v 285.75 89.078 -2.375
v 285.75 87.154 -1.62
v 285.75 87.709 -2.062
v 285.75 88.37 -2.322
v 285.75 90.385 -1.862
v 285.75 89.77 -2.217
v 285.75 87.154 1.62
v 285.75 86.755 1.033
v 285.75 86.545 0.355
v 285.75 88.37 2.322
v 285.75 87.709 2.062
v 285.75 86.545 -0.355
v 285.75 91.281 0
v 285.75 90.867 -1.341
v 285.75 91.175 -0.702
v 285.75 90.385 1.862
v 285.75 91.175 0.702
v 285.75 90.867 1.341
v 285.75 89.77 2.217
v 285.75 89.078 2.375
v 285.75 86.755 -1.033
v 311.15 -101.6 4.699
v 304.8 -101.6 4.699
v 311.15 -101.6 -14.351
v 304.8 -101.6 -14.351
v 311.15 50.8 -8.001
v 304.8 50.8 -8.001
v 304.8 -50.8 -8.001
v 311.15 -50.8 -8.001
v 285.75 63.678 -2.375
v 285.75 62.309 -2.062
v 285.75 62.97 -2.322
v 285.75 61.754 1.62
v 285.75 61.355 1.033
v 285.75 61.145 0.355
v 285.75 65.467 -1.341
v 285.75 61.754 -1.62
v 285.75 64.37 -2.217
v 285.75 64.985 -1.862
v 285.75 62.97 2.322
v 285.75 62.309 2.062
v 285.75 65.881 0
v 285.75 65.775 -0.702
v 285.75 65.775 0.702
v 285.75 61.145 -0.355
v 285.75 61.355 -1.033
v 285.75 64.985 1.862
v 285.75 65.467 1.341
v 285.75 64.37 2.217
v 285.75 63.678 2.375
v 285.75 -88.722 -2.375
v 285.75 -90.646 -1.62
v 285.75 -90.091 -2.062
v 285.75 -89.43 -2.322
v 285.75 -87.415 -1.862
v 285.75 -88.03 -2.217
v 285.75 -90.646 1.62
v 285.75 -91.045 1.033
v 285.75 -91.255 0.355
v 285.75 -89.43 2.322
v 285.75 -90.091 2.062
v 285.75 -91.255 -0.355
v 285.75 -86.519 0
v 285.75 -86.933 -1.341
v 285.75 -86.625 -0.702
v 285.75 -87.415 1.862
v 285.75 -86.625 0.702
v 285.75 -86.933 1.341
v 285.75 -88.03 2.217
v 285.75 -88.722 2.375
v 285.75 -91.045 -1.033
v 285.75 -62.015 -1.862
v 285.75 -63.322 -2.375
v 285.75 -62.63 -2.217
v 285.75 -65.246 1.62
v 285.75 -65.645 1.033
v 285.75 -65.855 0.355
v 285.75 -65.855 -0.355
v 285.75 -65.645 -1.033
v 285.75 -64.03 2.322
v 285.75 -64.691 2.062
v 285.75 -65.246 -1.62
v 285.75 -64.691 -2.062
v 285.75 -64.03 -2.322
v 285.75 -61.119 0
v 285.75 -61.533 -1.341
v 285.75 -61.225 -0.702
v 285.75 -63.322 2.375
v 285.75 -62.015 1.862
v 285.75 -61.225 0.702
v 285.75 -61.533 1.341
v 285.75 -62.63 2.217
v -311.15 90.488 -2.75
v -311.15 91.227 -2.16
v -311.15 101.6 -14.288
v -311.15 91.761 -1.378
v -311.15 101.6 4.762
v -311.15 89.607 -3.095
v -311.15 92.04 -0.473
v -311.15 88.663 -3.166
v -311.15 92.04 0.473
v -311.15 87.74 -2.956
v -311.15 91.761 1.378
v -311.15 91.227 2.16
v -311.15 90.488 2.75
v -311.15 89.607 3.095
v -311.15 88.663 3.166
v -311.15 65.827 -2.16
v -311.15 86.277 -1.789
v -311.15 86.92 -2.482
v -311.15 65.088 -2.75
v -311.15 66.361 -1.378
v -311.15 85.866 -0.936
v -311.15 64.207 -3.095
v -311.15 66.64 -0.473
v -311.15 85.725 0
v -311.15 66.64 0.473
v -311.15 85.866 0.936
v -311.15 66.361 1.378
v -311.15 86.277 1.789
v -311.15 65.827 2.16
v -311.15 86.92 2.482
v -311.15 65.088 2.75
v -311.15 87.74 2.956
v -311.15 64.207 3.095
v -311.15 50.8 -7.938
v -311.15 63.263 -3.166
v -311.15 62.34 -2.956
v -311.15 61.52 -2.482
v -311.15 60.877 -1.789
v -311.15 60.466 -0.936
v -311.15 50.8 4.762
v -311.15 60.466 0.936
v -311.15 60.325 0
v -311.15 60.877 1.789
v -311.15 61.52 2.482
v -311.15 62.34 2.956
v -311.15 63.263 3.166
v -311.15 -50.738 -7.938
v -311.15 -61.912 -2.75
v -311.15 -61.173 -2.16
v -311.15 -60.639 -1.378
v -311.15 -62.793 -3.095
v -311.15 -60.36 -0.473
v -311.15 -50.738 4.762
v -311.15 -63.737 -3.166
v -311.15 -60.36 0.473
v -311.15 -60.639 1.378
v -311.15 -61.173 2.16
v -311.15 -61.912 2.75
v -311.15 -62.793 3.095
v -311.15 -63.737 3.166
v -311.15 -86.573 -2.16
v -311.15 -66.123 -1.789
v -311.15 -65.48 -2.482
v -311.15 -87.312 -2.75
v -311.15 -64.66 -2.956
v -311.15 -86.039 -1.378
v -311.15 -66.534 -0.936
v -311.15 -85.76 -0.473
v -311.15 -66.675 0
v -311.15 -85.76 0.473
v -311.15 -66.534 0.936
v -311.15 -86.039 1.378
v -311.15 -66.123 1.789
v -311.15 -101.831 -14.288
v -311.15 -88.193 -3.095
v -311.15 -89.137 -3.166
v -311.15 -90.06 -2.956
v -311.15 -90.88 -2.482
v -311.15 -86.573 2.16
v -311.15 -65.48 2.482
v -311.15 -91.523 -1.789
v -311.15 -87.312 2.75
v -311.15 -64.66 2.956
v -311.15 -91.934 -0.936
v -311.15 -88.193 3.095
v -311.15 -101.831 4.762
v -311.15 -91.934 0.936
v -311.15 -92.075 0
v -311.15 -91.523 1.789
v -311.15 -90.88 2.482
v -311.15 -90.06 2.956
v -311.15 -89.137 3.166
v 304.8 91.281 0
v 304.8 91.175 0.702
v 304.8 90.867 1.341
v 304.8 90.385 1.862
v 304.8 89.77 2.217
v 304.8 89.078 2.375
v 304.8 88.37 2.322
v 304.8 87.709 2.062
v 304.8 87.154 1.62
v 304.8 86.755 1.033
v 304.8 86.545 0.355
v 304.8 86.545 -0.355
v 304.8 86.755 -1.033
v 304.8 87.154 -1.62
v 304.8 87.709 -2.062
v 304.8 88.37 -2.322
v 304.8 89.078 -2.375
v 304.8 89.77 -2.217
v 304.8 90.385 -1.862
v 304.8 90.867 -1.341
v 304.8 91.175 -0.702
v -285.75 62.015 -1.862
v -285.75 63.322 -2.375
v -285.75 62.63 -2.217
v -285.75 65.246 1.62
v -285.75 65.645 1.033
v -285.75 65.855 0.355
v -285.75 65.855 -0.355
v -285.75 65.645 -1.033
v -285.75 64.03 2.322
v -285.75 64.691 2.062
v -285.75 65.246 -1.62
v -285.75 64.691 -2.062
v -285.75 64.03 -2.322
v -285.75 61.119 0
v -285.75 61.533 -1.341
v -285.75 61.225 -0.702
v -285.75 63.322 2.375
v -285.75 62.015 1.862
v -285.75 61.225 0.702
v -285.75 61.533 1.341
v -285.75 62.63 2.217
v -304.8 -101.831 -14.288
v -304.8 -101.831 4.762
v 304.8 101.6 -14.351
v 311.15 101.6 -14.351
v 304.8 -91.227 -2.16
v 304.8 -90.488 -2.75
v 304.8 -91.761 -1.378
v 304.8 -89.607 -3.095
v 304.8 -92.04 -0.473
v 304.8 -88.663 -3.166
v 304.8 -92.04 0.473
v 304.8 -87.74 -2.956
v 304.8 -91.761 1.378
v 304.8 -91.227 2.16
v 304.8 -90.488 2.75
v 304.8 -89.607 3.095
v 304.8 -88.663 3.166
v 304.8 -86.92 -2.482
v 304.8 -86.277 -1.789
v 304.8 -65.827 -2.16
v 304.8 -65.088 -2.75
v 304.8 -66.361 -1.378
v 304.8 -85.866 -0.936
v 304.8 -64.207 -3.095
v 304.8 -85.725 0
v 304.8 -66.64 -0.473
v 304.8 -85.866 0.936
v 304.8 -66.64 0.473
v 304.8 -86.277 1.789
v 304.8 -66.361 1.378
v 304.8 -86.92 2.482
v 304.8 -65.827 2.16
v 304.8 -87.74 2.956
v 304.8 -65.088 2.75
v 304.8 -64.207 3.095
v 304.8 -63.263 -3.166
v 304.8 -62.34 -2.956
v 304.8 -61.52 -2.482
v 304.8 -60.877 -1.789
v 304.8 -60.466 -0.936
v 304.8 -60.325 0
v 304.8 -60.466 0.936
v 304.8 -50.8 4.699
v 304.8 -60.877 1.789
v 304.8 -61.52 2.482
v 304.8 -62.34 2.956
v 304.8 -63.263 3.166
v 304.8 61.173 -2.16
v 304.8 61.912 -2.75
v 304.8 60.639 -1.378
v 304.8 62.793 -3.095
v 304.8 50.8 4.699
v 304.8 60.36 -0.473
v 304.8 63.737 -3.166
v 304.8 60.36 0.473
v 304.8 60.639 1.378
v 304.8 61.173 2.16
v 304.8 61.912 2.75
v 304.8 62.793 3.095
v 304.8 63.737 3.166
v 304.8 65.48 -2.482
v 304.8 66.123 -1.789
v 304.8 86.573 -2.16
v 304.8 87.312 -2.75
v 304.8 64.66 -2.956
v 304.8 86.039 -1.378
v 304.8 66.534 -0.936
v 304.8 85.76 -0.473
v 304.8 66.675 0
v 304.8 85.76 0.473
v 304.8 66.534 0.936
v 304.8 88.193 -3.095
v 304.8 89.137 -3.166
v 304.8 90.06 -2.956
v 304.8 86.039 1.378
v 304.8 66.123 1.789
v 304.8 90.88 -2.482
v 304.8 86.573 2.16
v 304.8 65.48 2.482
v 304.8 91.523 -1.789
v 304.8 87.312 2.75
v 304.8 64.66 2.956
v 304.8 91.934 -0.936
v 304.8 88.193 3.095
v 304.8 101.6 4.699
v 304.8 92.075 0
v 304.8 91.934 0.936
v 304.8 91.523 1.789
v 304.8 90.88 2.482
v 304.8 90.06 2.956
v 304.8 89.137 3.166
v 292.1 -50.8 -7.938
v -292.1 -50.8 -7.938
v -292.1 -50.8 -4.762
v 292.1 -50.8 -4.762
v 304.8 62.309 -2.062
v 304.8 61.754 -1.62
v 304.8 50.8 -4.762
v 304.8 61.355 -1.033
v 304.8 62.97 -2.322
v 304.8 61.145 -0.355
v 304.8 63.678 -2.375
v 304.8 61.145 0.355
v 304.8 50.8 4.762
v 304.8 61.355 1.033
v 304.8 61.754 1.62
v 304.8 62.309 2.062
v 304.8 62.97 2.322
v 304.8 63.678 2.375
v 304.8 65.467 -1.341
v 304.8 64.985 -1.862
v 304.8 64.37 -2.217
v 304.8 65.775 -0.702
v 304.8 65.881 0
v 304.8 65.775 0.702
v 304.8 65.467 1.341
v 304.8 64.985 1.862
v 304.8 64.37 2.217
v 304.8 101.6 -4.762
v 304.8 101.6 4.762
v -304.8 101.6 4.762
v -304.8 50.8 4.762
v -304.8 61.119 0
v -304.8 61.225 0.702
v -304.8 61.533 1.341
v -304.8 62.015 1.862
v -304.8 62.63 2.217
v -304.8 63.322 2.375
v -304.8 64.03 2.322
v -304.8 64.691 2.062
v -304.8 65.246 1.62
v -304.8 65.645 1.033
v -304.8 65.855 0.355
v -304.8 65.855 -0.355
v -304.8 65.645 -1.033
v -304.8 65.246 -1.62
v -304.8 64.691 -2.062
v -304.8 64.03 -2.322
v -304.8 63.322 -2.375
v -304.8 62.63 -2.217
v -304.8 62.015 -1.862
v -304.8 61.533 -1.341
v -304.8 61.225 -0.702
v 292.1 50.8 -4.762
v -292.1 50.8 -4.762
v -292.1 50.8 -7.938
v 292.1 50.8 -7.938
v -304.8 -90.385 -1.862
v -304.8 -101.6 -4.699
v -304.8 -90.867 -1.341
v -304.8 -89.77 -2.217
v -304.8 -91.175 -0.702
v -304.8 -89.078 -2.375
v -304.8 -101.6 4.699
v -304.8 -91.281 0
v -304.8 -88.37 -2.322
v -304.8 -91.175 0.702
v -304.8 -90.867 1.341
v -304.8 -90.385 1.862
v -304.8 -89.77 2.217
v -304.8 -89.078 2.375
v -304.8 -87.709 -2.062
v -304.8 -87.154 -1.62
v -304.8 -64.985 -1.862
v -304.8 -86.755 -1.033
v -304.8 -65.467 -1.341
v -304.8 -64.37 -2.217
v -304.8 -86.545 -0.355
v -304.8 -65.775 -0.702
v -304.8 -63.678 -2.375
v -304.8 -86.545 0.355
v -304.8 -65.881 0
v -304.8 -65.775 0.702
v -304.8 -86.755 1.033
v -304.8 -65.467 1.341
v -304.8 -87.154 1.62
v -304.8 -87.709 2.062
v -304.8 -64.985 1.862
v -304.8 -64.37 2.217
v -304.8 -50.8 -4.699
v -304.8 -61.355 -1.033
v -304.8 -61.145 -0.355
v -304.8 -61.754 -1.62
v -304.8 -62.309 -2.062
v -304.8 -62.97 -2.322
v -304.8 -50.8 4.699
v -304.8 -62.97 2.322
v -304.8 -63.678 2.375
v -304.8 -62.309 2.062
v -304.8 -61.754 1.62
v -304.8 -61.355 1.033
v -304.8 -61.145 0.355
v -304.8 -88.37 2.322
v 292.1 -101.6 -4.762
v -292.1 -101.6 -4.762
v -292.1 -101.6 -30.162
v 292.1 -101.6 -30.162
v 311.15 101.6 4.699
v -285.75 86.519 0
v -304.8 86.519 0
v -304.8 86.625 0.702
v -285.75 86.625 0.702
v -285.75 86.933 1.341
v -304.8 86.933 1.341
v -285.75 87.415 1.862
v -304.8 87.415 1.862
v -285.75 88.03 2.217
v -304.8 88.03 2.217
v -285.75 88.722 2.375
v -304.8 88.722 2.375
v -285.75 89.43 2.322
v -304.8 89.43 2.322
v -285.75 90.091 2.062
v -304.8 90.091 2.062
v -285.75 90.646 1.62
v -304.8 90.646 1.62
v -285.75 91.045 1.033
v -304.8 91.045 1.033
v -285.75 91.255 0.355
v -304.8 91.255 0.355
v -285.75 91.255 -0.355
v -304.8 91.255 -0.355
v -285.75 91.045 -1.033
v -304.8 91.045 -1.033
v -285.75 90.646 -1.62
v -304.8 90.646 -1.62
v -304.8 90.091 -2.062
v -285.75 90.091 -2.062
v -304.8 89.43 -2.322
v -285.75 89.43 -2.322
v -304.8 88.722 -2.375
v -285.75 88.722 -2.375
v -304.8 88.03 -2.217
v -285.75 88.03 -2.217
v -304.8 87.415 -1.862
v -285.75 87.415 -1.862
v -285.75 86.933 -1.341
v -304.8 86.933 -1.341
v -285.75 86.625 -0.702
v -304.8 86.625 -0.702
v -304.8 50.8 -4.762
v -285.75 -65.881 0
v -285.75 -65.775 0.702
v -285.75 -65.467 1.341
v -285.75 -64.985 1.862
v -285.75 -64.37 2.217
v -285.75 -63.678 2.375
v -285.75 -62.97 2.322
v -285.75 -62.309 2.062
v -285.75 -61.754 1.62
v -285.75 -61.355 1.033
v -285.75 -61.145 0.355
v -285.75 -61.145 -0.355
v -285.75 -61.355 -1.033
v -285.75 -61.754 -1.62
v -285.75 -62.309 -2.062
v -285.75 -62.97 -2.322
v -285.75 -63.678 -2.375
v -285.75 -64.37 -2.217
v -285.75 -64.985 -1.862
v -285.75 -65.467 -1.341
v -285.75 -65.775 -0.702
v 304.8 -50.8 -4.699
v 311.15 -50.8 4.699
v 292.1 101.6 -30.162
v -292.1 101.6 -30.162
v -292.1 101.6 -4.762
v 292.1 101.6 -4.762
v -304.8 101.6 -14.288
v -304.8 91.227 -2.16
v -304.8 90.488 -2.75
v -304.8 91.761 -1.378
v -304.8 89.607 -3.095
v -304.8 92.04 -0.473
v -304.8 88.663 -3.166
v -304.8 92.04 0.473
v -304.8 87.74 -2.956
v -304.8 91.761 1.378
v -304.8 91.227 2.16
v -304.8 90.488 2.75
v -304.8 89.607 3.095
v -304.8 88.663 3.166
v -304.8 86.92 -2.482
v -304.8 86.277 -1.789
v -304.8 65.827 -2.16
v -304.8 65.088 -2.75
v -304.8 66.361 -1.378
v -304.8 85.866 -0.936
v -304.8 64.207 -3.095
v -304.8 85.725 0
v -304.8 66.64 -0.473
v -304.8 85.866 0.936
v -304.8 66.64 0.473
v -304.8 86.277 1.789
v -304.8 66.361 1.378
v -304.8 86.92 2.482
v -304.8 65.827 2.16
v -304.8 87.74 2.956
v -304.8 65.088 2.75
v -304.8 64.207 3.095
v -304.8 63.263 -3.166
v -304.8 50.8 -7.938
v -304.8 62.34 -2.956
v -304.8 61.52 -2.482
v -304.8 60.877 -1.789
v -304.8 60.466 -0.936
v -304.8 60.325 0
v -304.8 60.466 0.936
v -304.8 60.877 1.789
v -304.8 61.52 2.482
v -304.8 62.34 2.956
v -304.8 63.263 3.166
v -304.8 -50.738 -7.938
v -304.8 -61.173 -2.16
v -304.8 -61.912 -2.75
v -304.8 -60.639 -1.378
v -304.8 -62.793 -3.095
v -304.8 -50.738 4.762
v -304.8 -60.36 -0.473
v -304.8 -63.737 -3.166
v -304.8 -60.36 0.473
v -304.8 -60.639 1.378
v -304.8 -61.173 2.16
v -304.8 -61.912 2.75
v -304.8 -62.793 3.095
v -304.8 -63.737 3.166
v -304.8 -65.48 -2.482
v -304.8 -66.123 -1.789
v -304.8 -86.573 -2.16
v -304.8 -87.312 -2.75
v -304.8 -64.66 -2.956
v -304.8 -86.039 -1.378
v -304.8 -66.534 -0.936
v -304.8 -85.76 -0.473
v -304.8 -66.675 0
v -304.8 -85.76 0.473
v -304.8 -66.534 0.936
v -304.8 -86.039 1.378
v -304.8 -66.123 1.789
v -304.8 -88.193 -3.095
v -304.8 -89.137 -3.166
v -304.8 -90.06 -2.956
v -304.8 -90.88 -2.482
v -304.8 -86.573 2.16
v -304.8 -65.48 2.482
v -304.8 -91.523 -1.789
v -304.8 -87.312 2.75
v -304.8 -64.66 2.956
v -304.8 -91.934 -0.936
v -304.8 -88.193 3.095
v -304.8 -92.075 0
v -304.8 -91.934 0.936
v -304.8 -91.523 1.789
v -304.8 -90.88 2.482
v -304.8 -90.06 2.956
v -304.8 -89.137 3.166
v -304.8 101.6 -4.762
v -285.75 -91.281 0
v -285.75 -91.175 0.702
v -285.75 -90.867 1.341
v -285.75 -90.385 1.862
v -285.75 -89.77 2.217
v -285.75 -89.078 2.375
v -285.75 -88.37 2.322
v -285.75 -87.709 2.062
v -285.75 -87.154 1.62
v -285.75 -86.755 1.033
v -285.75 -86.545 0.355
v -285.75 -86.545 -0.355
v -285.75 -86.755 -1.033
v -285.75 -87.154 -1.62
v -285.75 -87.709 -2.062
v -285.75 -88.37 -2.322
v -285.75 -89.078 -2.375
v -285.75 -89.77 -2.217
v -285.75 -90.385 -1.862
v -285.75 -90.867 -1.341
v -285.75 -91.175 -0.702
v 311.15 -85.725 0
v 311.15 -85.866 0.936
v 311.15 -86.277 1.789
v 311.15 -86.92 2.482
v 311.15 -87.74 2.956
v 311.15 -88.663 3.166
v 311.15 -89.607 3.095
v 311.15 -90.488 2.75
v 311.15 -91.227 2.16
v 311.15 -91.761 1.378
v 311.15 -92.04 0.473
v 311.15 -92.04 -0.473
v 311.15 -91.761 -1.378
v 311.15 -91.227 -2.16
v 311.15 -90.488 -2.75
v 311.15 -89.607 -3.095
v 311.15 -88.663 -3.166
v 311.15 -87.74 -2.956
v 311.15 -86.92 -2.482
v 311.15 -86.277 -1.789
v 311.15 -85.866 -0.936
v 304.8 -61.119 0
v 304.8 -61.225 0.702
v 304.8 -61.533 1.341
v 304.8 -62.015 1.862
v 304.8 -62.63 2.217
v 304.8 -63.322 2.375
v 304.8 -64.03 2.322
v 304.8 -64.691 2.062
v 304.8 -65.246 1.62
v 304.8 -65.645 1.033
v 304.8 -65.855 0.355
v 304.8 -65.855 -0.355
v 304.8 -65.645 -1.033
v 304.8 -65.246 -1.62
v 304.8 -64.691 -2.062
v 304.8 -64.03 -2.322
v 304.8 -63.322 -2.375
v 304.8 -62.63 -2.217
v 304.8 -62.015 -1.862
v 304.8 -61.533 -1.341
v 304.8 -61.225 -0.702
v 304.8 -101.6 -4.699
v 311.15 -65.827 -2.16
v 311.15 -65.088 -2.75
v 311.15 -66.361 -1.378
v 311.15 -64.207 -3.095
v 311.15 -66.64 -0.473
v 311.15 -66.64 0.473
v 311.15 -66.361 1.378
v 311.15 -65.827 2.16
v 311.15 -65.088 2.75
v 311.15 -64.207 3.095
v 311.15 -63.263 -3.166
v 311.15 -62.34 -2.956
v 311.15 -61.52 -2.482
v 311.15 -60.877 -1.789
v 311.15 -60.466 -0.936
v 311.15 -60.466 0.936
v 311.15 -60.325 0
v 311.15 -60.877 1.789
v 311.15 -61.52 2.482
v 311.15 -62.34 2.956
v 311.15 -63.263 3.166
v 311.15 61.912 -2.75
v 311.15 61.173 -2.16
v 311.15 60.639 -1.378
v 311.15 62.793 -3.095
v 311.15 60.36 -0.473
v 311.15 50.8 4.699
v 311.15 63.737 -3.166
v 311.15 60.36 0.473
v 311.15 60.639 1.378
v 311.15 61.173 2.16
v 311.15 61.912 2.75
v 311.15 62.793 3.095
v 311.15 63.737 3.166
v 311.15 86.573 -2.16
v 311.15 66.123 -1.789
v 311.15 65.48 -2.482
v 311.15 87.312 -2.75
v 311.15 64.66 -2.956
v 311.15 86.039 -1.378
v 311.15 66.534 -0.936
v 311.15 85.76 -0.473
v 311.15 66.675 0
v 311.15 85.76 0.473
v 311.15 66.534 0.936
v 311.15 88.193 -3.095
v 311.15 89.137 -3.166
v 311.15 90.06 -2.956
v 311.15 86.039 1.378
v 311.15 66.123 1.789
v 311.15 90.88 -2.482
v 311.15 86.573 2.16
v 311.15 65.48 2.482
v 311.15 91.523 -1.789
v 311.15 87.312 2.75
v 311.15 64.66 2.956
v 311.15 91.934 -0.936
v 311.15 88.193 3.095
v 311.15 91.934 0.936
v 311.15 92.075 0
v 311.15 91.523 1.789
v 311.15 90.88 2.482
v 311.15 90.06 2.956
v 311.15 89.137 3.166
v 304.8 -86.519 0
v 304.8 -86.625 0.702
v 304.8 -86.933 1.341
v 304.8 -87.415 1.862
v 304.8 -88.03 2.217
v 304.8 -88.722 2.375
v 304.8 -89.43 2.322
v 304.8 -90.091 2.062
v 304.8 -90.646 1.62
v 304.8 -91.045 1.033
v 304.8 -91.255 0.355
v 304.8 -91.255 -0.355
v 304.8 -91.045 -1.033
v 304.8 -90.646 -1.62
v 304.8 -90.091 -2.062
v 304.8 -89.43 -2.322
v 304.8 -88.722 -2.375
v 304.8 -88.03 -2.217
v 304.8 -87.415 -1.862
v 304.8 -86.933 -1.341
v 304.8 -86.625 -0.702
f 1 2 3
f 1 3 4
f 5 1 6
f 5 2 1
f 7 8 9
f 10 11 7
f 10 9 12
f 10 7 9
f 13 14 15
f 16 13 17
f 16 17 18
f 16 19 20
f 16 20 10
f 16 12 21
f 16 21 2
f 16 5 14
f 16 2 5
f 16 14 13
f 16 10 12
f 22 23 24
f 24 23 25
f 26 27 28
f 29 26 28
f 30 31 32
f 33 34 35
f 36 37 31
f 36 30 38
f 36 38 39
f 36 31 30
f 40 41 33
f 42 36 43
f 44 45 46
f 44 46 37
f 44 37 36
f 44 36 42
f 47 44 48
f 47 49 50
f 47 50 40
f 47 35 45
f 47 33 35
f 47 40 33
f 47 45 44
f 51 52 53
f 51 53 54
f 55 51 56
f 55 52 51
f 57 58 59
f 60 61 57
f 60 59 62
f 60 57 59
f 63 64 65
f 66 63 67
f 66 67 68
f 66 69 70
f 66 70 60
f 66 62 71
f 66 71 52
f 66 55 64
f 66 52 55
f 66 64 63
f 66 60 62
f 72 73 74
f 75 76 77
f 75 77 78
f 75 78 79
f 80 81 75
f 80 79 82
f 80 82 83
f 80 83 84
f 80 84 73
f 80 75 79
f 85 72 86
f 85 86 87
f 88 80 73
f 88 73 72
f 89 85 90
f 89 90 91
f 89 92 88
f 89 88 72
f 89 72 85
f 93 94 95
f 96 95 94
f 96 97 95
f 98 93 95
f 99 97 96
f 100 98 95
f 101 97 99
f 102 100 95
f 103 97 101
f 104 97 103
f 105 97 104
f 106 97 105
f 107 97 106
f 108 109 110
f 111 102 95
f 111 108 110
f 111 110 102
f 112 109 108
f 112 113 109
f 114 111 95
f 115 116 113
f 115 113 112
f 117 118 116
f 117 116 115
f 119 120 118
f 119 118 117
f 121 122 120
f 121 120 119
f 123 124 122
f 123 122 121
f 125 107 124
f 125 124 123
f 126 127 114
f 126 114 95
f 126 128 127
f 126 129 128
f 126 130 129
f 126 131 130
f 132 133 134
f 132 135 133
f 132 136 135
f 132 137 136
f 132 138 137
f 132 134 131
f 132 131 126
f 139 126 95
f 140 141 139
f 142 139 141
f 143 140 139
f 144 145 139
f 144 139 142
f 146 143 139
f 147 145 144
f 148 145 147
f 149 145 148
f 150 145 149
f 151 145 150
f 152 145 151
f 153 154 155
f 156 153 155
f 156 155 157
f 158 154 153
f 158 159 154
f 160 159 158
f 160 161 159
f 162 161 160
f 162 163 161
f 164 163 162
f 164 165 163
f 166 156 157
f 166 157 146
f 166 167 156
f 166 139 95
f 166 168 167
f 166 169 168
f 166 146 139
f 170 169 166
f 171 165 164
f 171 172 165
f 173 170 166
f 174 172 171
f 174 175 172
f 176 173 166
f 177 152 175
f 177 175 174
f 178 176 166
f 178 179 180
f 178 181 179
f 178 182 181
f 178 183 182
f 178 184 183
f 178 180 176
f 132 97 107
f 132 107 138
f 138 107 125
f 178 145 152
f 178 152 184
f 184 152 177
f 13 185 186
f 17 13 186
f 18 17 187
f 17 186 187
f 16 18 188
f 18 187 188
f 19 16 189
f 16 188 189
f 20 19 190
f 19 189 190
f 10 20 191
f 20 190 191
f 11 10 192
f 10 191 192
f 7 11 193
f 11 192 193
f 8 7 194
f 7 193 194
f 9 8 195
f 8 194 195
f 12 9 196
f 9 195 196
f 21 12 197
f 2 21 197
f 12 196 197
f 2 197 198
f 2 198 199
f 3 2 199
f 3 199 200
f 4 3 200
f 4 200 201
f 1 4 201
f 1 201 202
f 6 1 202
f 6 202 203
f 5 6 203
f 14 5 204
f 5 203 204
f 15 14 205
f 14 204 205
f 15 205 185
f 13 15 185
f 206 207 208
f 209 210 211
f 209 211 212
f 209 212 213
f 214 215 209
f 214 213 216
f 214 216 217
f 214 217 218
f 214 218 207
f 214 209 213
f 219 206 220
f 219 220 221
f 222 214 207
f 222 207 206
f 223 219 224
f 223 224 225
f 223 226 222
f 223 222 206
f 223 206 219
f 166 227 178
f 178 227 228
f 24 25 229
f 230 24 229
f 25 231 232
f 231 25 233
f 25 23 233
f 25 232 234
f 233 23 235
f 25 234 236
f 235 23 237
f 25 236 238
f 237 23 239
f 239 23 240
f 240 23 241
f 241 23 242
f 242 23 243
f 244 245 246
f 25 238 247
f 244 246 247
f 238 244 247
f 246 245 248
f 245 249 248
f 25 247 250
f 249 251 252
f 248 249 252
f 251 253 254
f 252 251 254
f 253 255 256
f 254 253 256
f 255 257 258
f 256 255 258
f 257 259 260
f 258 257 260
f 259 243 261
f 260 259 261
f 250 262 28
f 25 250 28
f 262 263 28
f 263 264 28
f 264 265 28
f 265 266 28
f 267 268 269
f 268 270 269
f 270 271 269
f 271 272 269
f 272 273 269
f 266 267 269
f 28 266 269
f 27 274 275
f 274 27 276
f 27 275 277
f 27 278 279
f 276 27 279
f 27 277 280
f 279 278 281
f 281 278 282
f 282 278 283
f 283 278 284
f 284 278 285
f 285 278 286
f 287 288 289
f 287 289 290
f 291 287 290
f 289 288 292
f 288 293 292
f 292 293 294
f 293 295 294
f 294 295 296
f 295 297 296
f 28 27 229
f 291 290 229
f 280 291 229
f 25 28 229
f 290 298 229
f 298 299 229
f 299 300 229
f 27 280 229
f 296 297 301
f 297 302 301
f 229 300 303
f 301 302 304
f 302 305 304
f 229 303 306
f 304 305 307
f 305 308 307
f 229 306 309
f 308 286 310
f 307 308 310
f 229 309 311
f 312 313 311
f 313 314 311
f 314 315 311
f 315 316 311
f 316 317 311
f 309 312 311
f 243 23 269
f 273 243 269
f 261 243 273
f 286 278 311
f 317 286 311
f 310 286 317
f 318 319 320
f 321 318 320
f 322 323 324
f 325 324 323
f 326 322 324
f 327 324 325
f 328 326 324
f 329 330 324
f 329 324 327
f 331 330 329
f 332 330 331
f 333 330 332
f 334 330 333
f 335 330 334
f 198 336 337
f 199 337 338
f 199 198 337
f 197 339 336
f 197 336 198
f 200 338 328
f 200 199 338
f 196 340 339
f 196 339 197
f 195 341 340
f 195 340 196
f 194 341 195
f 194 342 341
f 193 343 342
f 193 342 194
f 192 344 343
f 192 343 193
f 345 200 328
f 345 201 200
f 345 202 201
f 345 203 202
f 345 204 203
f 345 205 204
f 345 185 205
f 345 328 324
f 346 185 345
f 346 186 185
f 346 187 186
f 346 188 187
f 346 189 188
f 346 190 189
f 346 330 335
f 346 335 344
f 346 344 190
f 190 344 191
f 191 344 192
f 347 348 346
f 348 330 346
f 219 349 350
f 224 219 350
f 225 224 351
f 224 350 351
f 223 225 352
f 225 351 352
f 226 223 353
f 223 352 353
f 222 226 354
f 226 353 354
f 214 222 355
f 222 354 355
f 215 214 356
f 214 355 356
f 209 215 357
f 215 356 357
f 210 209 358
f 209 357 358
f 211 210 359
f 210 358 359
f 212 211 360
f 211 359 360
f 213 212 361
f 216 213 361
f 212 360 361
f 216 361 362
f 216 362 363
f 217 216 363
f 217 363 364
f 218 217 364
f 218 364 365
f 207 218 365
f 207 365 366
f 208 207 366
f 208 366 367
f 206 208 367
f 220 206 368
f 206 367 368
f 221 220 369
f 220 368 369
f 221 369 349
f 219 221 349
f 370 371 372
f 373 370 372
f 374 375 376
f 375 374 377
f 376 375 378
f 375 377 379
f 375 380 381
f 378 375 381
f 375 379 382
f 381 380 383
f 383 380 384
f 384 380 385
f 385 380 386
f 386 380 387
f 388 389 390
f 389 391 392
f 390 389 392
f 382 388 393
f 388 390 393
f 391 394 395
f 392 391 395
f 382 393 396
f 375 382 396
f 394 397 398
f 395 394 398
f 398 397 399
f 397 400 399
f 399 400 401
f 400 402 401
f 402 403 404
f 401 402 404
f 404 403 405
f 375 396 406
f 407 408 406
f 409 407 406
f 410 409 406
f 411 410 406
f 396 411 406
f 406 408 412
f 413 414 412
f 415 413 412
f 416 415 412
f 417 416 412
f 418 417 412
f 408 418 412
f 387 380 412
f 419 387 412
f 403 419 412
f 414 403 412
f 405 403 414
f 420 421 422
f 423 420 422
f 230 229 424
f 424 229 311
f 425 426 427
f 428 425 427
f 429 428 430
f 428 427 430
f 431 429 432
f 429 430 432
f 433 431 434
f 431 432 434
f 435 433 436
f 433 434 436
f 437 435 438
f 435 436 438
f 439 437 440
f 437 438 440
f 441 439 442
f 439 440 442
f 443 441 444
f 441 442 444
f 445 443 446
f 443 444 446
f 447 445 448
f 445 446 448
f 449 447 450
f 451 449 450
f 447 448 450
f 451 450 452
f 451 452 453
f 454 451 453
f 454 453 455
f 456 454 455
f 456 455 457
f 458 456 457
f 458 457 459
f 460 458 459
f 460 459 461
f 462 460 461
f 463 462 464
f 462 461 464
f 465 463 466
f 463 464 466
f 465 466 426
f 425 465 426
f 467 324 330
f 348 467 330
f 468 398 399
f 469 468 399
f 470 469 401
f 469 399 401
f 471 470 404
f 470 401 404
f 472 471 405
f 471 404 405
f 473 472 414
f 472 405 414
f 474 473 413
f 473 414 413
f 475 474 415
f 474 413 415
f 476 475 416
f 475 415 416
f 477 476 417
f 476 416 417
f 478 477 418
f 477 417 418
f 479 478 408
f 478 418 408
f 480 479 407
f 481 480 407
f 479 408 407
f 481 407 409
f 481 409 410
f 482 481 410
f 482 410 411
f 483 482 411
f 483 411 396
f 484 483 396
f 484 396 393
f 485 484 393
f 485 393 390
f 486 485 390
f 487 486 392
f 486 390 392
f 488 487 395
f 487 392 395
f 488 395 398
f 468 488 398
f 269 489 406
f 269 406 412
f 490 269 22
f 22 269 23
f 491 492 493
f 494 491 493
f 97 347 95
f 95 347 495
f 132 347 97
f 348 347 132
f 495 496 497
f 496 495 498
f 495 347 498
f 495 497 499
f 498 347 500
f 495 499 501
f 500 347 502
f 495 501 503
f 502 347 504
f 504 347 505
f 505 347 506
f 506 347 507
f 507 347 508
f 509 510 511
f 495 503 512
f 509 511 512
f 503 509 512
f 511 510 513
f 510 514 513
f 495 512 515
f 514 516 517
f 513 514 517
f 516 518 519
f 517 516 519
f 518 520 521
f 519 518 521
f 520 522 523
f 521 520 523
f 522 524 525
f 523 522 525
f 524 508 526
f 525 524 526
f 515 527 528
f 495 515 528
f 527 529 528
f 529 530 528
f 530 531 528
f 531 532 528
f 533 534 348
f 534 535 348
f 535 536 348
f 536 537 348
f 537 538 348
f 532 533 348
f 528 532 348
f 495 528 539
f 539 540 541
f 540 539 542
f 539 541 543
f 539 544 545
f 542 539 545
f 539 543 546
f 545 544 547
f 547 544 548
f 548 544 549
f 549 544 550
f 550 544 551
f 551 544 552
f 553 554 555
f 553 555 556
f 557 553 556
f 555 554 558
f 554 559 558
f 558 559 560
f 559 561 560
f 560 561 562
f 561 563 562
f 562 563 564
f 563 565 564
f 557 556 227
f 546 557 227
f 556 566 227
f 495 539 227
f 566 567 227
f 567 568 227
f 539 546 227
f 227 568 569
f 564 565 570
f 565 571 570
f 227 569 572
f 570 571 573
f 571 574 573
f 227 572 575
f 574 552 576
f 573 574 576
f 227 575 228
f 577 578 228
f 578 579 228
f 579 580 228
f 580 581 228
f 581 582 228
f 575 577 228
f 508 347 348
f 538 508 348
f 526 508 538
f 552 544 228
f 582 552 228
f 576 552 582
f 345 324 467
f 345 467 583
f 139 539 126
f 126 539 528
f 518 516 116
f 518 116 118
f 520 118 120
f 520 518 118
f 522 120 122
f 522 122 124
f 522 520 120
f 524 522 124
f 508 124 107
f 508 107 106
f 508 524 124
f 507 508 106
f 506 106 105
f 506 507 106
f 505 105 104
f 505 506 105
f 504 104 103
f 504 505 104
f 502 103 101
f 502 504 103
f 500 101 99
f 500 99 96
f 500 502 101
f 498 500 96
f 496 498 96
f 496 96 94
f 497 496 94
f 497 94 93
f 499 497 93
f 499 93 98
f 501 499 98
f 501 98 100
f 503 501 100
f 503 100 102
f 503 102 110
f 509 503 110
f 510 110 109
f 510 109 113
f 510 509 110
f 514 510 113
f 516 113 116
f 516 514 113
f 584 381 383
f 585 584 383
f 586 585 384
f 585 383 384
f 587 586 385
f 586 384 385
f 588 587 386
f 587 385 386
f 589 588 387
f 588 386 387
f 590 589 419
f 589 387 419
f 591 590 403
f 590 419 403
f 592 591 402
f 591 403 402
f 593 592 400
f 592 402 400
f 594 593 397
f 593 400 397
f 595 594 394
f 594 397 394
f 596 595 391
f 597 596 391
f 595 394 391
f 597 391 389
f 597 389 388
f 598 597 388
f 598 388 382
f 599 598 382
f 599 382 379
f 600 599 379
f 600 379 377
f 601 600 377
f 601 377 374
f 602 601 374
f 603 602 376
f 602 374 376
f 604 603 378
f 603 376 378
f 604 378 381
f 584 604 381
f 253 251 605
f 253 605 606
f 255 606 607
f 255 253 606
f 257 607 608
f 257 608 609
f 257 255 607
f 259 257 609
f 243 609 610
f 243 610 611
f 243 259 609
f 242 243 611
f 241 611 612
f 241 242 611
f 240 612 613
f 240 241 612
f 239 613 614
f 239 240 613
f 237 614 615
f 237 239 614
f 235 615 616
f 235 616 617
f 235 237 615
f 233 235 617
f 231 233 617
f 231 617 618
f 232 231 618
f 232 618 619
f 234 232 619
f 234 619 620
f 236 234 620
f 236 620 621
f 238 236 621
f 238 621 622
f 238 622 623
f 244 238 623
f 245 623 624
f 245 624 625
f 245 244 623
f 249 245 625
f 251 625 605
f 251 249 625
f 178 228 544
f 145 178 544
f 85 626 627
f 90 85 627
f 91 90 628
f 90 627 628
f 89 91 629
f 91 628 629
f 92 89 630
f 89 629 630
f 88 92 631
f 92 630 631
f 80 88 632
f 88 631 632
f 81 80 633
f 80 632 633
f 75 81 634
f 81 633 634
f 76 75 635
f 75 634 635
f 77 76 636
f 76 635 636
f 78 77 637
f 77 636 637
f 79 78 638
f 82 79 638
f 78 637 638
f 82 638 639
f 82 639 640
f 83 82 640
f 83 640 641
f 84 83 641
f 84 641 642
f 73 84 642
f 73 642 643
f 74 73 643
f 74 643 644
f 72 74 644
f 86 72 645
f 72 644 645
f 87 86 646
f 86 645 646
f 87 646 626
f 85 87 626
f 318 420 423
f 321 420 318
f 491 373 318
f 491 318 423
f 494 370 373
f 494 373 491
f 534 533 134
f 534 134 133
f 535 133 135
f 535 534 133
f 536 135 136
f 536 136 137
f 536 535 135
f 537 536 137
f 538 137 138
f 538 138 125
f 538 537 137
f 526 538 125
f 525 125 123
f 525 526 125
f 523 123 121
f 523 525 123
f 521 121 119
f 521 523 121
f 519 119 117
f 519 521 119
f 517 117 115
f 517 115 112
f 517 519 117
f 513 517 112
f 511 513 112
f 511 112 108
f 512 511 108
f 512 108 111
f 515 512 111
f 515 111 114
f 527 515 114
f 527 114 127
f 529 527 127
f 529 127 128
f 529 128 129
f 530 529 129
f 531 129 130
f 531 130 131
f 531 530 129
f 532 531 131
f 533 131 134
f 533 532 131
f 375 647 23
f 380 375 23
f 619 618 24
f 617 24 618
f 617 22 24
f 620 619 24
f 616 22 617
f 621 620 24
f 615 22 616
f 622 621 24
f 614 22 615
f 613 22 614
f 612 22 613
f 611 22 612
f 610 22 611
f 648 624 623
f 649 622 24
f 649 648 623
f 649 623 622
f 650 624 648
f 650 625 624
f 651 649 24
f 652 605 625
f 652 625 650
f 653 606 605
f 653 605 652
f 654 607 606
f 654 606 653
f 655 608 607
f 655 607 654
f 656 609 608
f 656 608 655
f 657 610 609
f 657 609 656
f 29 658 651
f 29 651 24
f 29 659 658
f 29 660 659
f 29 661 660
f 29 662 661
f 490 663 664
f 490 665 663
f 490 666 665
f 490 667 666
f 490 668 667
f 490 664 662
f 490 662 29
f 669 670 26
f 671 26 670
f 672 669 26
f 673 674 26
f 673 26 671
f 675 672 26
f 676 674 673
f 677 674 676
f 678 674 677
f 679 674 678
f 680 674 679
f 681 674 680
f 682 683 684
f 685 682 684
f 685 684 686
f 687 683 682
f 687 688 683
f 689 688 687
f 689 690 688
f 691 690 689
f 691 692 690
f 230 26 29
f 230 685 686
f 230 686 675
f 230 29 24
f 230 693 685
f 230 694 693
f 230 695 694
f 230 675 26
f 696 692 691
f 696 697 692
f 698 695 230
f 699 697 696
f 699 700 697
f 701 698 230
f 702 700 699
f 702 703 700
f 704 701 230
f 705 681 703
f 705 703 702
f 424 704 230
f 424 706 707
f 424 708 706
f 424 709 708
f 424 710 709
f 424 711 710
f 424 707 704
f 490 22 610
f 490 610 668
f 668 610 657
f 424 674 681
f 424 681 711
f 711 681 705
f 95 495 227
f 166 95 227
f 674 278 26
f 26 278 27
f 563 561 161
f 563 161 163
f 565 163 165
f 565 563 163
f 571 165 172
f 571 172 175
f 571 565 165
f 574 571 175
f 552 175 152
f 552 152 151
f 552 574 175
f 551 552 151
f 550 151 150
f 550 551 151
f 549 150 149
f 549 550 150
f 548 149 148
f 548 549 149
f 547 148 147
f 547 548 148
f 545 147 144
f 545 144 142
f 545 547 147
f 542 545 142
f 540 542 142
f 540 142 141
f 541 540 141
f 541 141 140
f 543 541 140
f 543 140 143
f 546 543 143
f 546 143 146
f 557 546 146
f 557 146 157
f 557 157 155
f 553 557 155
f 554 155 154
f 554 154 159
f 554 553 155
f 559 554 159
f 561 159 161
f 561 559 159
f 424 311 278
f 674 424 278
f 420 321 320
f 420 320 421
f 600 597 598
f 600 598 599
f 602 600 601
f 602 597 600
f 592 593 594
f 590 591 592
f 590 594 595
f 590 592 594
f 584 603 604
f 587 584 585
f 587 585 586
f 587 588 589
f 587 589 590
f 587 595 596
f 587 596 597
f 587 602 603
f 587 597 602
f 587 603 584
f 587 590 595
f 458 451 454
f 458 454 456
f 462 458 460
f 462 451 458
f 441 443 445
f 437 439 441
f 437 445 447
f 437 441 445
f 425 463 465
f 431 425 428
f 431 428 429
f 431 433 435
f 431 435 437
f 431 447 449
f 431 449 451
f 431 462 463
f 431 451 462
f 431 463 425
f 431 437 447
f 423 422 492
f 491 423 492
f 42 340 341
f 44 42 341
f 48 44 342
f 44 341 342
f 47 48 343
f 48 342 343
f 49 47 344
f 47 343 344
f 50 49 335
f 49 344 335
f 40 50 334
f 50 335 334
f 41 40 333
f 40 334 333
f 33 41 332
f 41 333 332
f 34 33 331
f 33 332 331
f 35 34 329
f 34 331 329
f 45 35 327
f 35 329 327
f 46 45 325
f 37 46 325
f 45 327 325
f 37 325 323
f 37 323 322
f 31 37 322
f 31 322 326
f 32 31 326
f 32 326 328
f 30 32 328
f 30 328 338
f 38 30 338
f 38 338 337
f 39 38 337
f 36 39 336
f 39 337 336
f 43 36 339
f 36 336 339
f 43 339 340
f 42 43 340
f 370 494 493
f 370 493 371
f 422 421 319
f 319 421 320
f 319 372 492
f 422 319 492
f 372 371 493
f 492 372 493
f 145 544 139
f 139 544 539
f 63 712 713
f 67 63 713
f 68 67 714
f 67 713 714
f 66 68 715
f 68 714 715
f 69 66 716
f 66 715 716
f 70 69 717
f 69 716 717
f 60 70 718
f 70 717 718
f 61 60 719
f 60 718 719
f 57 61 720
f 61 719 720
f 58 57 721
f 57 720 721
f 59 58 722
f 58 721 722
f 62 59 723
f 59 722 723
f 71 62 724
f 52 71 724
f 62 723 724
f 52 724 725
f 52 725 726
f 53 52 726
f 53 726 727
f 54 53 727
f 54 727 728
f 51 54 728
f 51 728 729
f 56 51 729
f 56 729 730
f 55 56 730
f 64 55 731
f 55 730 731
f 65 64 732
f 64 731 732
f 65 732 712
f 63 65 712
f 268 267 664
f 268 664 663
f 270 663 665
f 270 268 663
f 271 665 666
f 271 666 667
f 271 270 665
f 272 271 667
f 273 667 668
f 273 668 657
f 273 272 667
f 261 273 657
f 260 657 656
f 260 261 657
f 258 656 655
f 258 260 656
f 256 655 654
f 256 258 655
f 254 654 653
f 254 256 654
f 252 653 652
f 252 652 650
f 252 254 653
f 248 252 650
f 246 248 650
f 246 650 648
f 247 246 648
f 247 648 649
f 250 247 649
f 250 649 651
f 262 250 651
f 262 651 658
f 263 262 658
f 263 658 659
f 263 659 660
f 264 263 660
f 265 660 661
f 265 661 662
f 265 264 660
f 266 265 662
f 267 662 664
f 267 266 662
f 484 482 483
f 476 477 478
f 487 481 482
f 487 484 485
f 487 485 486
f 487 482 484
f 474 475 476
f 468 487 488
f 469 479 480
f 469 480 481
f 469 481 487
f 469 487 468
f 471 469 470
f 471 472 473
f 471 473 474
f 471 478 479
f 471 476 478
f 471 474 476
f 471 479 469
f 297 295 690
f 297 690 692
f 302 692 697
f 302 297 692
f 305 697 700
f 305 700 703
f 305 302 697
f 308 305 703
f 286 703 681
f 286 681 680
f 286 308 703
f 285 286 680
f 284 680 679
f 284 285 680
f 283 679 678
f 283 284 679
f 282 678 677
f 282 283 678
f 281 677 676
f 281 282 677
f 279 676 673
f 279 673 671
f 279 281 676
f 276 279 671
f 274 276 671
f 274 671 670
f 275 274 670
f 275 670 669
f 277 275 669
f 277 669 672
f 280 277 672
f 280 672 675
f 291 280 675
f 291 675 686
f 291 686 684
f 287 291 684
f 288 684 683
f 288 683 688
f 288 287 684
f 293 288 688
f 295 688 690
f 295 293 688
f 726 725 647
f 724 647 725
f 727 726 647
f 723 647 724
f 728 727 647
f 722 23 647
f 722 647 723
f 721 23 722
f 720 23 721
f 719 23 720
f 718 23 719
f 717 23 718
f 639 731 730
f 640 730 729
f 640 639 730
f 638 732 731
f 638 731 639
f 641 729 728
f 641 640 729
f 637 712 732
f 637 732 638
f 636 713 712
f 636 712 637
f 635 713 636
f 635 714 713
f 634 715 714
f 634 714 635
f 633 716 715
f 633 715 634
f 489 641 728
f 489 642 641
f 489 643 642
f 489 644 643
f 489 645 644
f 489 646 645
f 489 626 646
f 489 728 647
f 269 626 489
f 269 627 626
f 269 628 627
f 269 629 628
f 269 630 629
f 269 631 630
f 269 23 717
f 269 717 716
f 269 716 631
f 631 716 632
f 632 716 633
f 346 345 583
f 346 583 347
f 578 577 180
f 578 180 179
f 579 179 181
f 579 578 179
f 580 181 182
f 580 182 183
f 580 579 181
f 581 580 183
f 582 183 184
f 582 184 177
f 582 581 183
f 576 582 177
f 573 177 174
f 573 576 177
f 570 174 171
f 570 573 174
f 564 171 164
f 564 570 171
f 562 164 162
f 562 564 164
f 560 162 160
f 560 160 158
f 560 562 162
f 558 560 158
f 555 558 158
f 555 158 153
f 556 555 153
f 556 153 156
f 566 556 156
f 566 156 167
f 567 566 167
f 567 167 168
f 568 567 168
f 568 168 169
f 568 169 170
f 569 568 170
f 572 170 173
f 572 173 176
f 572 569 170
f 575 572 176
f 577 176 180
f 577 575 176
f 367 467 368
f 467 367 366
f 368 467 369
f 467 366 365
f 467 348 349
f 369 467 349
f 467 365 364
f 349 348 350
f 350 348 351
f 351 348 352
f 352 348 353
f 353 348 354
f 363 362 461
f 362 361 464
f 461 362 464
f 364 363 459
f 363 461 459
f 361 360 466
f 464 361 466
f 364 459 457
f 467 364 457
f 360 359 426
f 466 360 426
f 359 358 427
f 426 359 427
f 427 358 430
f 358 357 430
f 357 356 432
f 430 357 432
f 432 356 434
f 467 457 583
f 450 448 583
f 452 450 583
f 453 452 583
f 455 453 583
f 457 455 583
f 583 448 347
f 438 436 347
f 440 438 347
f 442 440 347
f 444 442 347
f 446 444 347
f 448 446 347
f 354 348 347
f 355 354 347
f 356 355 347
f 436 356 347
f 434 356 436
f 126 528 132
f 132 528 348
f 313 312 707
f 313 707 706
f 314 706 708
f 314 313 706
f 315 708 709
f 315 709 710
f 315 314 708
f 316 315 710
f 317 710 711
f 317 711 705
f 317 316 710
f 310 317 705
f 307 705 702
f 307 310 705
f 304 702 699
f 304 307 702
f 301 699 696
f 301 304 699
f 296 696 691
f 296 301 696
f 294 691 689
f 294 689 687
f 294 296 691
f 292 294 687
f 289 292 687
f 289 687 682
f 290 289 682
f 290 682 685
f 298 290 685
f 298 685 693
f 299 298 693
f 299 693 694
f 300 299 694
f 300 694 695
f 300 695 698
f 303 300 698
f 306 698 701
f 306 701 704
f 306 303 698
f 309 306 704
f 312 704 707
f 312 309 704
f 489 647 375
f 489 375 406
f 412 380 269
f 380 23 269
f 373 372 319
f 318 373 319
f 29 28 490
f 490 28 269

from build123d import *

# Parameters (mm, degrees)
F0_W      = 50.8
F0_H      = 9.398
F1_DEPTH  = 304.8
F0_H_2    = 9.525
F2_R      = 2.38125
F3_DEPTH  = 19.05
F4_R      = 2.38125
F5_DEPTH  = 19.05
F6_R      = 3.175
F6_W      = 50.8
F6_H      = 9.525
F7_DEPTH  = 6.35
F8_R      = 3.175
F9_DEPTH  = 6.35
F12_DEPTH = 584.2


with BuildPart() as f1:
    # F0 (on Right) → F1 (new body, symmetric)
    with BuildSketch(Plane.YZ):
        with Locations((-76.2, 0)):
            Rectangle(F0_W, F0_H)
    extrude(amount=F1_DEPTH, both=True)


with BuildPart() as f1b:
    # F0 (on Right) → F1, piece 2 (new body, symmetric)
    with BuildSketch(Plane.YZ):
        with Locations((76.2, 0)):
            Rectangle(F0_W, F0_H_2)
    extrude(amount=F1_DEPTH, both=True)


with BuildPart() as f3_tool:
    # F2 (on face) → F3 (new body)
    with BuildSketch(Plane.YZ.offset(304.8)):
        with Locations((-88.9, 0)):
            Circle(F2_R)
        with Locations((-63.5, 0)):
            Circle(F2_R)
        with Locations((63.5, 0)):
            Circle(F2_R)
        with Locations((88.9, 0)):
            Circle(F2_R)
    extrude(amount=-F3_DEPTH)


with BuildPart() as f1_1:
    add(f1.part)

    # F3: cut by f3_tool
    add(f3_tool.part, mode=Mode.SUBTRACT)


with BuildPart() as f1b_1:
    add(f1b.part)

    # F3: cut by f3_tool
    add(f3_tool.part, mode=Mode.SUBTRACT)


with BuildPart() as f5_tool:
    # F4 (on face) → F5 (new body)
    with BuildSketch(Plane(origin=(-304.8, 0, 0), x_dir=(0, -1, 0), z_dir=(-1, 0, 0))):
        with Locations((-88.9, 0)):
            Circle(F4_R)
        with Locations((-63.5, 0)):
            Circle(F4_R)
        with Locations((63.5, 0)):
            Circle(F4_R)
        with Locations((88.9, 0)):
            Circle(F4_R)
    extrude(amount=-F5_DEPTH)


with BuildPart() as f1_2:
    add(f1_1.part)

    # F5: cut by f5_tool
    add(f5_tool.part, mode=Mode.SUBTRACT)


with BuildPart() as f1b_2:
    add(f1b_1.part)

    # F5: cut by f5_tool
    add(f5_tool.part, mode=Mode.SUBTRACT)


with BuildPart() as f7:
    # F6 (on face) → F7 (new body)
    with BuildSketch(Plane(origin=(-304.8, 0, 0), x_dir=(0, -1, 0), z_dir=(-1, 0, 0))):
        Polygon((-50.8, -4.7625), (-101.6, -4.7625), (-101.6, -14.2875), (101.8309146166, -14.2875), (101.8309146166, 4.7625), (50.7380478084, 4.7625), (50.7380478084, -7.9375), (-50.8, -7.9375), align=None)
        with Locations((63.5, 0)):
            Circle(F6_R, mode=Mode.SUBTRACT)
        with Locations((88.9, 0)):
            Circle(F6_R, mode=Mode.SUBTRACT)
        with Locations((-76.2, 0)):
            Rectangle(F6_W, F6_H)
        with Locations((-88.9, 0)):
            Circle(F6_R, mode=Mode.SUBTRACT)
        with Locations((-63.5, 0)):
            Circle(F6_R, mode=Mode.SUBTRACT)
    extrude(amount=F7_DEPTH)


with BuildPart() as f9:
    # F8 (on face) → F9 (new body)
    with BuildSketch(Plane.YZ.offset(304.8)):
        Polygon((-50.8, 4.699), (-101.6, 4.699), (-101.6, -14.351), (101.6, -14.351), (101.6, 4.699), (50.8, 4.699), (50.8, -8.001), (-50.8, -8.001), align=None)
        with Locations((-88.9, 0)):
            Circle(F8_R, mode=Mode.SUBTRACT)
        with Locations((-63.5, 0)):
            Circle(F8_R, mode=Mode.SUBTRACT)
        with Locations((63.5, 0)):
            Circle(F8_R, mode=Mode.SUBTRACT)
        with Locations((88.9, 0)):
            Circle(F8_R, mode=Mode.SUBTRACT)
    extrude(amount=F9_DEPTH)


with BuildPart() as f12:
    # F11 (on offset) → F12 (new body)
    with BuildSketch(Plane.YZ.offset(-292.1)):
        Polygon((-101.6, -30.1625), (101.6, -30.1625), (101.6, -4.7625), (50.8, -4.7625), (50.8, -7.9375), (-50.8, -7.9375), (-50.8, -4.7625), (-101.6, -4.7625), align=None)
    extrude(amount=F12_DEPTH)


solid = Compound([f1_2.part, f1b_2.part, f7.part, f9.part, f12.part])
